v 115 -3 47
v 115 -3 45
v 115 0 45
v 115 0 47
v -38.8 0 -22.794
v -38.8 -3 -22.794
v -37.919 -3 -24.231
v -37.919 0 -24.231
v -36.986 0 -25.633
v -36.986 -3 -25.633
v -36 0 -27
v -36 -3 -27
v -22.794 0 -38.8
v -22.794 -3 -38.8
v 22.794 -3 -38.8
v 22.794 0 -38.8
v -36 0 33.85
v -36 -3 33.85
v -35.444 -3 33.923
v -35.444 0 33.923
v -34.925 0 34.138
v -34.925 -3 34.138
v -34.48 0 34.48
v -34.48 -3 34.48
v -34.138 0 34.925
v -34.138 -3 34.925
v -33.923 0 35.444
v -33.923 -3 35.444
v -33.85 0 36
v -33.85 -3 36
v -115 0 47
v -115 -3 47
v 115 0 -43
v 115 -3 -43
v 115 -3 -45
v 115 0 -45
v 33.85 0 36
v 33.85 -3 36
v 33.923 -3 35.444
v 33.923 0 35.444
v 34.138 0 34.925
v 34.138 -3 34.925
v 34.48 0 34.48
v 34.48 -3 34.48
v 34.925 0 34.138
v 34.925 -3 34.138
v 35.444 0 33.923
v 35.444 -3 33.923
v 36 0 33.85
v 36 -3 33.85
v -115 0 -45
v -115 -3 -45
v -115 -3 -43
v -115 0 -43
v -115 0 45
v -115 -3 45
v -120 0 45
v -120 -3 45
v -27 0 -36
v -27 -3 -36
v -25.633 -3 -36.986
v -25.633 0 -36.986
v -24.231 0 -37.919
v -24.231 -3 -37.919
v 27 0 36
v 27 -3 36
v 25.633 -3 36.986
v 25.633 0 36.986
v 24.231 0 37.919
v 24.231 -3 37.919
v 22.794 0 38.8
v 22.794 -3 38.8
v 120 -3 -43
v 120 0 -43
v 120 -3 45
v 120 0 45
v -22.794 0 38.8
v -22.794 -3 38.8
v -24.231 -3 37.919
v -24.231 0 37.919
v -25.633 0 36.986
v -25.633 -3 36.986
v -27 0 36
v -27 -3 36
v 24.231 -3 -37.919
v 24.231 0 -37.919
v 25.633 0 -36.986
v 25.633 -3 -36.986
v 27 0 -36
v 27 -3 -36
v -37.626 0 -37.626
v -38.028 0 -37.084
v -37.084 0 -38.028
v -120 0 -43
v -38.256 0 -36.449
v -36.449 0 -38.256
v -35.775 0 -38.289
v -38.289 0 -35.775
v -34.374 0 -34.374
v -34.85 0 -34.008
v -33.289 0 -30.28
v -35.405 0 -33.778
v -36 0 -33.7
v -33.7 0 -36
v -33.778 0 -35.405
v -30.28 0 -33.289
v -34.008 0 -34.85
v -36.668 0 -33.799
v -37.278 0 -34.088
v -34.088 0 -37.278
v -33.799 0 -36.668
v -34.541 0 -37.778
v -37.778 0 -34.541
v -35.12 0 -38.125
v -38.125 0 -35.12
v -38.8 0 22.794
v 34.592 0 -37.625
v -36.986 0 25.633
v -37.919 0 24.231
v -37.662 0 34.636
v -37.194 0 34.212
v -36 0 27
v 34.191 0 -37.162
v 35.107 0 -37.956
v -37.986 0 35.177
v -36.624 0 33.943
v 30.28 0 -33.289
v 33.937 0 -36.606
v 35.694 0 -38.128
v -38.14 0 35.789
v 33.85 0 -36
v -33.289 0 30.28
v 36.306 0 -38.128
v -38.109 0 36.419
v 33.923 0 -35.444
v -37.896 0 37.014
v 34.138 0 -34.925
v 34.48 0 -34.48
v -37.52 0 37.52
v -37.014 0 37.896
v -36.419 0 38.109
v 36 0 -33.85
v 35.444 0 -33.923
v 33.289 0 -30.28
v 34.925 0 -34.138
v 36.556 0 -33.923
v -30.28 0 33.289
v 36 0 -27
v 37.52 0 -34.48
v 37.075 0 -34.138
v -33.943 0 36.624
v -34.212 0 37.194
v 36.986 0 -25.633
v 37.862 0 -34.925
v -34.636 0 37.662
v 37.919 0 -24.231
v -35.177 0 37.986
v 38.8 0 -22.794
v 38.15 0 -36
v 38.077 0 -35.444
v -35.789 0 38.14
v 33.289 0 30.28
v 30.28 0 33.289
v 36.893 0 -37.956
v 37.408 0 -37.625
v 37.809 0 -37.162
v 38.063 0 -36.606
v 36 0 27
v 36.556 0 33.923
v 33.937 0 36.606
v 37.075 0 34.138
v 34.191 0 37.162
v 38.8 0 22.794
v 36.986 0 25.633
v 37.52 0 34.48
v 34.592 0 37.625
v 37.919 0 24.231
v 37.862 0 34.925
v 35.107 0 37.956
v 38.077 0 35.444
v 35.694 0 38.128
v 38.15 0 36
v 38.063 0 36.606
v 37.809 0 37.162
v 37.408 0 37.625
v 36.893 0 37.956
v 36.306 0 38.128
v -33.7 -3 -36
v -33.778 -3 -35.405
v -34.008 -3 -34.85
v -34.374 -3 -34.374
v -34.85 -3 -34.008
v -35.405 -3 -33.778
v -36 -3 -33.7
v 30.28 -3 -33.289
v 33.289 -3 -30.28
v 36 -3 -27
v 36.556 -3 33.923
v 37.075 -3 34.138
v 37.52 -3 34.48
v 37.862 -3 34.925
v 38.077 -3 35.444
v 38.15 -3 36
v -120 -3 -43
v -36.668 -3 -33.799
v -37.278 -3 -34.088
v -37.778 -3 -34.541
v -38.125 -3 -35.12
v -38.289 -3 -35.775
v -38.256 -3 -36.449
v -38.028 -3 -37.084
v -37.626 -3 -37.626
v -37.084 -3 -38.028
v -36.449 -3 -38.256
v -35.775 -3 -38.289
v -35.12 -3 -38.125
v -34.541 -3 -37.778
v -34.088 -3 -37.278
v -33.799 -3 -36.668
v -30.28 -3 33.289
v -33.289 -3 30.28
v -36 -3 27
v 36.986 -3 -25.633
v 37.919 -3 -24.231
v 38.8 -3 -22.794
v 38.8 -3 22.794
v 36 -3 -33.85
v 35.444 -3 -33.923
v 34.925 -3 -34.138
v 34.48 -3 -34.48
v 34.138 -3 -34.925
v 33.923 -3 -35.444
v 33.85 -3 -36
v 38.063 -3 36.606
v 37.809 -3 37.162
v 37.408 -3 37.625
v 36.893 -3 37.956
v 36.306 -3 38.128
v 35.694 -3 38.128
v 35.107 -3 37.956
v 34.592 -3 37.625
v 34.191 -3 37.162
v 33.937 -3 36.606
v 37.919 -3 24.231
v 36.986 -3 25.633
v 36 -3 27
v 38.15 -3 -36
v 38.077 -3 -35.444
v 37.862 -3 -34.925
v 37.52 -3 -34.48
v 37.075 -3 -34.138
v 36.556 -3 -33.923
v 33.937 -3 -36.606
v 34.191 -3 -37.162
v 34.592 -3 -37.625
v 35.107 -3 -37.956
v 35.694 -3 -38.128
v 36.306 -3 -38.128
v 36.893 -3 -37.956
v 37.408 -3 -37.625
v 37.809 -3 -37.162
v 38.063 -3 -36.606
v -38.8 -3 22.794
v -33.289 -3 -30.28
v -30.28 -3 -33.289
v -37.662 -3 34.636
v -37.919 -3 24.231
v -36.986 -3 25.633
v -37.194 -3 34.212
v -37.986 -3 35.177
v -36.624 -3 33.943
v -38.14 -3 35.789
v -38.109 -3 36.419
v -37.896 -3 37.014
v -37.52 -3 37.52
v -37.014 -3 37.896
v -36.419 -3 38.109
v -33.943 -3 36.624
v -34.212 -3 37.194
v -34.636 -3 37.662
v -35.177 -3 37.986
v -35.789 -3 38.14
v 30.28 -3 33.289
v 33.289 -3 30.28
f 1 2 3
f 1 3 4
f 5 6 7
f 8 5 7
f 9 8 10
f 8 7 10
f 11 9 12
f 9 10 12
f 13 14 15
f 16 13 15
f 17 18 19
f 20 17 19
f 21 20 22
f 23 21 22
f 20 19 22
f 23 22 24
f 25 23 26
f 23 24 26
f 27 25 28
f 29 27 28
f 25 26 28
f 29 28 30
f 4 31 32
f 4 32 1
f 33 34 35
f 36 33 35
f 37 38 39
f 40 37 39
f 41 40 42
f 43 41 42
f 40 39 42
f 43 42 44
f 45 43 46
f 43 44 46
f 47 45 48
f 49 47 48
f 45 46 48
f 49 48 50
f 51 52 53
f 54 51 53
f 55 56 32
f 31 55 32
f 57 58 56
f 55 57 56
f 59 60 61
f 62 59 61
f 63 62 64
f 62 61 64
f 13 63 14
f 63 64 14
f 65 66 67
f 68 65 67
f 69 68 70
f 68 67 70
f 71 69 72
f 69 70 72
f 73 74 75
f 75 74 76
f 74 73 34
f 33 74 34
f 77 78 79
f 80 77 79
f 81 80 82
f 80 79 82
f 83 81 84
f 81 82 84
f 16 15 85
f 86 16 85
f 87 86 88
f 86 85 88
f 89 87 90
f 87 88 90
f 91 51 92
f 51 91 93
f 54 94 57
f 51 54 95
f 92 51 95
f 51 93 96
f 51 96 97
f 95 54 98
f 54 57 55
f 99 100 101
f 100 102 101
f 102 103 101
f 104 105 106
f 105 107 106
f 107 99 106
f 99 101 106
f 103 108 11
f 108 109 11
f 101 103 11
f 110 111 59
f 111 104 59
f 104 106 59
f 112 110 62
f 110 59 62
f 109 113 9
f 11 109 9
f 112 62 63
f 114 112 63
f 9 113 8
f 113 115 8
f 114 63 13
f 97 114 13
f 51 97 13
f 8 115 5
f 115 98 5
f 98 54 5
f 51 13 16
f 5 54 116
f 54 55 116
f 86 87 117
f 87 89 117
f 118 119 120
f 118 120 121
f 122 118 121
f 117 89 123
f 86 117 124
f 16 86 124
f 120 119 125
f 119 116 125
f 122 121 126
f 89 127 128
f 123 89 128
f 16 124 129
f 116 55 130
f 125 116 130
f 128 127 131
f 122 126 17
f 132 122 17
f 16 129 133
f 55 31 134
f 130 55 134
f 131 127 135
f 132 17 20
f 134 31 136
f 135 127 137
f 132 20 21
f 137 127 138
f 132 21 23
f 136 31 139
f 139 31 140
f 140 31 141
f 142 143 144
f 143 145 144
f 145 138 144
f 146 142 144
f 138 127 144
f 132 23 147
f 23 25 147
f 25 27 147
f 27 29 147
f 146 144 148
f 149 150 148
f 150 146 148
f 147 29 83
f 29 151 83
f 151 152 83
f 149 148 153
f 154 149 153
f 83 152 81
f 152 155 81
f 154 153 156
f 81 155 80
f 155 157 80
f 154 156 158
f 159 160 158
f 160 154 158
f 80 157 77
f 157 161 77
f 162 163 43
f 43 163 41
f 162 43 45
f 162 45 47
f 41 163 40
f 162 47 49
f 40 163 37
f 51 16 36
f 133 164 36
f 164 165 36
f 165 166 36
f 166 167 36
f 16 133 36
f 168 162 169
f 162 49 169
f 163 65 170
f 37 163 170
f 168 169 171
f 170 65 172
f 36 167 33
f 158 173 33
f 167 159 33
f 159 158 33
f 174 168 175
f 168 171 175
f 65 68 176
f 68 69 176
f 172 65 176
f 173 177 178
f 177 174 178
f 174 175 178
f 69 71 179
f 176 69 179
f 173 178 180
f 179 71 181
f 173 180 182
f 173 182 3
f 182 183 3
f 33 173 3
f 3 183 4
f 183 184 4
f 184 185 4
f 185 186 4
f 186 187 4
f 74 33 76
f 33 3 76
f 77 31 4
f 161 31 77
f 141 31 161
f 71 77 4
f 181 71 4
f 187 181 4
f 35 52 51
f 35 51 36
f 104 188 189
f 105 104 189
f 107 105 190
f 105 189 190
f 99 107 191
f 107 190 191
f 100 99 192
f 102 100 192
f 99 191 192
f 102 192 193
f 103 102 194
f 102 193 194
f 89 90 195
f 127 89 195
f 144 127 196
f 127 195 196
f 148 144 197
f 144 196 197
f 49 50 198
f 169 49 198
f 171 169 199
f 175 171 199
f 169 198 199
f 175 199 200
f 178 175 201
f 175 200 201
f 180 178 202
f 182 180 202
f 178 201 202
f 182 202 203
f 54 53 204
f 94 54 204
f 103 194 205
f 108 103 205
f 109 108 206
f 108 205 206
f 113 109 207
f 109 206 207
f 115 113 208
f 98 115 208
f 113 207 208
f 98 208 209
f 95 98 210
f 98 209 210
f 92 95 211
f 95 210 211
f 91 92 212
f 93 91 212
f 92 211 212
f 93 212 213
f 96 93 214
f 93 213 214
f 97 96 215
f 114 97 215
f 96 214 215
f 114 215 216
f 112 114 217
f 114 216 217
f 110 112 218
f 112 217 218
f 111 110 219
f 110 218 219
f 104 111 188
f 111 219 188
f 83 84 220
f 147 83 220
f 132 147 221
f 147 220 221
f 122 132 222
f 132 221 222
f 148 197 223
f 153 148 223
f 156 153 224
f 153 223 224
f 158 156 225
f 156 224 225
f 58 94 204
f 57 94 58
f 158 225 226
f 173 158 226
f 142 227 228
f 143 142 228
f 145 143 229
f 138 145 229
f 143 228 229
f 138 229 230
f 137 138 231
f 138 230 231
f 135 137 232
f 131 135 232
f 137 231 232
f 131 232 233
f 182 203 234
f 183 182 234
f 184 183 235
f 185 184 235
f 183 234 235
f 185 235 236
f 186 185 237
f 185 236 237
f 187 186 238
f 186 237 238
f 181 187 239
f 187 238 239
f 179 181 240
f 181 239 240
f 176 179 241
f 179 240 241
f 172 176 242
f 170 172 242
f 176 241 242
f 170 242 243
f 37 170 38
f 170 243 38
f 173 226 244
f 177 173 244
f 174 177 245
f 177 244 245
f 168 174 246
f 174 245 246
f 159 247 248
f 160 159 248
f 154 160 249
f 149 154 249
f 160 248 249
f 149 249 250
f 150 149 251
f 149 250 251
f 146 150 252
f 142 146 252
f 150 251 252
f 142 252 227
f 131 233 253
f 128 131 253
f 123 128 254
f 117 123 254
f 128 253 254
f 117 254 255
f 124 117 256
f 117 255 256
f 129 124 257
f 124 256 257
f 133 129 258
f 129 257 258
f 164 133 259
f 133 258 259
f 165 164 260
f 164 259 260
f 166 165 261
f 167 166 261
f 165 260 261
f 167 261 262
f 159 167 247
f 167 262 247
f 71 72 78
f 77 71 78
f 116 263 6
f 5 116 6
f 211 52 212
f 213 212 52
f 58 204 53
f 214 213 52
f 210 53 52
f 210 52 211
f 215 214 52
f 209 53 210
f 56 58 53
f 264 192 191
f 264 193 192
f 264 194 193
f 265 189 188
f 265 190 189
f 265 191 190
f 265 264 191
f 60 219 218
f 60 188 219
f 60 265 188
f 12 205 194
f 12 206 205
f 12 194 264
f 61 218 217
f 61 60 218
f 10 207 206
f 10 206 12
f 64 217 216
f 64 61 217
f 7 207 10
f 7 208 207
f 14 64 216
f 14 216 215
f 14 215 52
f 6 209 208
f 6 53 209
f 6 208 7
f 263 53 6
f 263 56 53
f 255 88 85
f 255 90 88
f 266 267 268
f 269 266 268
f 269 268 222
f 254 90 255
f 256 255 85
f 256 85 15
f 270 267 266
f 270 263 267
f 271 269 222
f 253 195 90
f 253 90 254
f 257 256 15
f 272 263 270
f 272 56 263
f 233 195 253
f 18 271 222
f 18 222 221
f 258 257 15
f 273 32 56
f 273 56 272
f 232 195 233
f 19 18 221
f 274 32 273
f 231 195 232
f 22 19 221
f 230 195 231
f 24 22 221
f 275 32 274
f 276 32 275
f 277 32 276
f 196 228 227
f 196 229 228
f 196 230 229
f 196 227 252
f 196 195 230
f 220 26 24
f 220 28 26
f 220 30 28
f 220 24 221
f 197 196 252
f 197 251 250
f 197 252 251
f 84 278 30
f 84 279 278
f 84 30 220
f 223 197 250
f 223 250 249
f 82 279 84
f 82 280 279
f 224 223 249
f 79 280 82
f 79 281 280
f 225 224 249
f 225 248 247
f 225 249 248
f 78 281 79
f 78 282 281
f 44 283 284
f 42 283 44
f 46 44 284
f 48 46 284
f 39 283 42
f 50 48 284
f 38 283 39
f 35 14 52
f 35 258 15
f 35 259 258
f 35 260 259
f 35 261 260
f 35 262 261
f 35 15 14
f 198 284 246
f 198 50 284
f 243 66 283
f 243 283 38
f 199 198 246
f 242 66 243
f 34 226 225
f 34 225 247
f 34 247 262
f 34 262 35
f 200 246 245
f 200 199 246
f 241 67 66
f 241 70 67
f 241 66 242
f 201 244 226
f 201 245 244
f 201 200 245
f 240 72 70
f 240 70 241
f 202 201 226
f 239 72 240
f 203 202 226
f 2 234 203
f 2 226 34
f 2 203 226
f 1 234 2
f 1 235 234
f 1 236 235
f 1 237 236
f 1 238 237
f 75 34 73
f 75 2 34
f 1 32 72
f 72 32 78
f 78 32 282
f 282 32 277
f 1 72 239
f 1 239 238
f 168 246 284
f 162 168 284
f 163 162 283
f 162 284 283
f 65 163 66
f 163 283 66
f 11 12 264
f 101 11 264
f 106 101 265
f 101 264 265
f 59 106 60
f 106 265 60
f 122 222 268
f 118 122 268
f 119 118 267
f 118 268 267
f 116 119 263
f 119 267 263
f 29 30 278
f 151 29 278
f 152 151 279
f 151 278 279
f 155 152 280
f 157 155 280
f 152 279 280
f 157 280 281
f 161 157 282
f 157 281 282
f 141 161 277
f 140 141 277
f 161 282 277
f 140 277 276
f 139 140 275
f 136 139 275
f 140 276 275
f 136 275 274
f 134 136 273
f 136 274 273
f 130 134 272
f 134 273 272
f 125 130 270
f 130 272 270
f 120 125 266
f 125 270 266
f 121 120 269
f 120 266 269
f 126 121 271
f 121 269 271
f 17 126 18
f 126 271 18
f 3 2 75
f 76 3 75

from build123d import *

# Parameters (mm, degrees)
F0_W     = 240
F0_H     = 94
F1_DEPTH = 3
F2_W     = 5
F2_H     = 2
F2_W_2   = 230
F3_DEPTH = 25
F5_DEPTH = 25


with BuildPart() as f1:
    # F0 (on Front) → F1 (new body)
    with BuildSketch(Plane.XZ):
        Rectangle(F0_W, F0_H)
    extrude(amount=F1_DEPTH)

    # F2 (on face) → F3 (cut)
    with BuildSketch(Plane.XZ.offset(3)):
        with Locations((-117.5, 46)):
            Rectangle(F2_W, F2_H)
        Polygon((-120, -43), (-120, -47), (-115, -47), (-115, -45), (-115, -43), align=None)
        with Locations((0, -46)):
            Rectangle(F2_W_2, F2_H)
        Polygon((115, -45), (115, -47), (120, -47), (120, -43), (115, -43), align=None)
        with Locations((117.5, 46)):
            Rectangle(F2_W, F2_H)
    extrude(amount=-F3_DEPTH, mode=Mode.SUBTRACT)

    # F4 (on face) → F5 (cut)
    with BuildSketch(Plane.XZ.offset(3)):
        with BuildLine():
            Line((-36, 36), (-36, 33.85))
            ThreePointArc((-36, 33.85), (-34.47972, 34.47972), (-33.85, 36))
            Line((-33.85, 36), (-36, 36))
        make_face()
        with BuildLine():
            ThreePointArc((-33.85, 36), (-37.52028, 37.52028), (-36, 33.85))
            Line((-36, 33.85), (-36, 36))
            Line((-36, 36), (-33.85, 36))
        make_face()
        with BuildLine():
            Line((36, 36), (36, 33.85))
            ThreePointArc((36, 33.85), (37.52028, 34.47972), (38.15, 36))
            ThreePointArc((38.15, 36), (36, 38.15), (33.85, 36))
            Line((33.85, 36), (36, 36))
        make_face()
        with BuildLine():
            ThreePointArc((33.85, 36), (34.47972, 34.47972), (36, 33.85))
            Line((36, 33.85), (36, 36))
            Line((36, 36), (33.85, 36))
        make_face()
        with BuildLine():
            Line((36, -33.85), (36, -36))
            Line((36, -36), (33.85, -36))
            ThreePointArc((33.85, -36), (36, -38.15), (38.15, -36))
            ThreePointArc((38.15, -36), (37.52028, -34.47972), (36, -33.85))
        make_face()
        with BuildLine():
            Line((33.85, -36), (36, -36))
            Line((36, -36), (36, -33.85))
            ThreePointArc((36, -33.85), (34.47972, -34.47972), (33.85, -36))
        make_face()
        with BuildLine():
            ThreePointArc((-36, -33.7), (-37.626346, -37.626346), (-33.7, -36))
            Line((-33.7, -36), (-36, -36))
            Line((-36, -36), (-36, -33.7))
        make_face()
        with BuildLine():
            Line((-36, -36), (-33.7, -36))
            ThreePointArc((-33.7, -36), (-34.373654, -34.373654), (-36, -33.7))
            Line((-36, -33.7), (-36, -36))
        make_face()
        with BuildLine():
            ThreePointArc((22.793859, -38.8), (24.936261, -37.459083), (27, -36))
            ThreePointArc((27, -36), (31.819805, -31.819805), (36, -27))
            ThreePointArc((36, -27), (37.459083, -24.936261), (38.8, -22.793859))
            Line((38.8, -22.793859), (38.8, 22.793859))
            ThreePointArc((38.8, 22.793859), (37.459083, 24.936261), (36, 27))
            ThreePointArc((36, 27), (31.819805, 31.819805), (27, 36))
            ThreePointArc((27, 36), (24.936261, 37.459083), (22.793859, 38.8))
            Line((22.793859, 38.8), (-22.793859, 38.8))
            ThreePointArc((-22.793859, 38.8), (-24.936261, 37.459083), (-27, 36))
            ThreePointArc((-27, 36), (-31.819805, 31.819805), (-36, 27))
            ThreePointArc((-36, 27), (-37.459083, 24.936261), (-38.8, 22.793859))
            Line((-38.8, 22.793859), (-38.8, -22.793859))
            ThreePointArc((-38.8, -22.793859), (-37.459083, -24.936261), (-36, -27))
            ThreePointArc((-36, -27), (-31.819805, -31.819805), (-27, -36))
            ThreePointArc((-27, -36), (-24.936261, -37.459083), (-22.793859, -38.8))
            Line((-22.793859, -38.8), (22.793859, -38.8))
        make_face()
    extrude(amount=-F5_DEPTH, mode=Mode.SUBTRACT)


solid = f1.part
